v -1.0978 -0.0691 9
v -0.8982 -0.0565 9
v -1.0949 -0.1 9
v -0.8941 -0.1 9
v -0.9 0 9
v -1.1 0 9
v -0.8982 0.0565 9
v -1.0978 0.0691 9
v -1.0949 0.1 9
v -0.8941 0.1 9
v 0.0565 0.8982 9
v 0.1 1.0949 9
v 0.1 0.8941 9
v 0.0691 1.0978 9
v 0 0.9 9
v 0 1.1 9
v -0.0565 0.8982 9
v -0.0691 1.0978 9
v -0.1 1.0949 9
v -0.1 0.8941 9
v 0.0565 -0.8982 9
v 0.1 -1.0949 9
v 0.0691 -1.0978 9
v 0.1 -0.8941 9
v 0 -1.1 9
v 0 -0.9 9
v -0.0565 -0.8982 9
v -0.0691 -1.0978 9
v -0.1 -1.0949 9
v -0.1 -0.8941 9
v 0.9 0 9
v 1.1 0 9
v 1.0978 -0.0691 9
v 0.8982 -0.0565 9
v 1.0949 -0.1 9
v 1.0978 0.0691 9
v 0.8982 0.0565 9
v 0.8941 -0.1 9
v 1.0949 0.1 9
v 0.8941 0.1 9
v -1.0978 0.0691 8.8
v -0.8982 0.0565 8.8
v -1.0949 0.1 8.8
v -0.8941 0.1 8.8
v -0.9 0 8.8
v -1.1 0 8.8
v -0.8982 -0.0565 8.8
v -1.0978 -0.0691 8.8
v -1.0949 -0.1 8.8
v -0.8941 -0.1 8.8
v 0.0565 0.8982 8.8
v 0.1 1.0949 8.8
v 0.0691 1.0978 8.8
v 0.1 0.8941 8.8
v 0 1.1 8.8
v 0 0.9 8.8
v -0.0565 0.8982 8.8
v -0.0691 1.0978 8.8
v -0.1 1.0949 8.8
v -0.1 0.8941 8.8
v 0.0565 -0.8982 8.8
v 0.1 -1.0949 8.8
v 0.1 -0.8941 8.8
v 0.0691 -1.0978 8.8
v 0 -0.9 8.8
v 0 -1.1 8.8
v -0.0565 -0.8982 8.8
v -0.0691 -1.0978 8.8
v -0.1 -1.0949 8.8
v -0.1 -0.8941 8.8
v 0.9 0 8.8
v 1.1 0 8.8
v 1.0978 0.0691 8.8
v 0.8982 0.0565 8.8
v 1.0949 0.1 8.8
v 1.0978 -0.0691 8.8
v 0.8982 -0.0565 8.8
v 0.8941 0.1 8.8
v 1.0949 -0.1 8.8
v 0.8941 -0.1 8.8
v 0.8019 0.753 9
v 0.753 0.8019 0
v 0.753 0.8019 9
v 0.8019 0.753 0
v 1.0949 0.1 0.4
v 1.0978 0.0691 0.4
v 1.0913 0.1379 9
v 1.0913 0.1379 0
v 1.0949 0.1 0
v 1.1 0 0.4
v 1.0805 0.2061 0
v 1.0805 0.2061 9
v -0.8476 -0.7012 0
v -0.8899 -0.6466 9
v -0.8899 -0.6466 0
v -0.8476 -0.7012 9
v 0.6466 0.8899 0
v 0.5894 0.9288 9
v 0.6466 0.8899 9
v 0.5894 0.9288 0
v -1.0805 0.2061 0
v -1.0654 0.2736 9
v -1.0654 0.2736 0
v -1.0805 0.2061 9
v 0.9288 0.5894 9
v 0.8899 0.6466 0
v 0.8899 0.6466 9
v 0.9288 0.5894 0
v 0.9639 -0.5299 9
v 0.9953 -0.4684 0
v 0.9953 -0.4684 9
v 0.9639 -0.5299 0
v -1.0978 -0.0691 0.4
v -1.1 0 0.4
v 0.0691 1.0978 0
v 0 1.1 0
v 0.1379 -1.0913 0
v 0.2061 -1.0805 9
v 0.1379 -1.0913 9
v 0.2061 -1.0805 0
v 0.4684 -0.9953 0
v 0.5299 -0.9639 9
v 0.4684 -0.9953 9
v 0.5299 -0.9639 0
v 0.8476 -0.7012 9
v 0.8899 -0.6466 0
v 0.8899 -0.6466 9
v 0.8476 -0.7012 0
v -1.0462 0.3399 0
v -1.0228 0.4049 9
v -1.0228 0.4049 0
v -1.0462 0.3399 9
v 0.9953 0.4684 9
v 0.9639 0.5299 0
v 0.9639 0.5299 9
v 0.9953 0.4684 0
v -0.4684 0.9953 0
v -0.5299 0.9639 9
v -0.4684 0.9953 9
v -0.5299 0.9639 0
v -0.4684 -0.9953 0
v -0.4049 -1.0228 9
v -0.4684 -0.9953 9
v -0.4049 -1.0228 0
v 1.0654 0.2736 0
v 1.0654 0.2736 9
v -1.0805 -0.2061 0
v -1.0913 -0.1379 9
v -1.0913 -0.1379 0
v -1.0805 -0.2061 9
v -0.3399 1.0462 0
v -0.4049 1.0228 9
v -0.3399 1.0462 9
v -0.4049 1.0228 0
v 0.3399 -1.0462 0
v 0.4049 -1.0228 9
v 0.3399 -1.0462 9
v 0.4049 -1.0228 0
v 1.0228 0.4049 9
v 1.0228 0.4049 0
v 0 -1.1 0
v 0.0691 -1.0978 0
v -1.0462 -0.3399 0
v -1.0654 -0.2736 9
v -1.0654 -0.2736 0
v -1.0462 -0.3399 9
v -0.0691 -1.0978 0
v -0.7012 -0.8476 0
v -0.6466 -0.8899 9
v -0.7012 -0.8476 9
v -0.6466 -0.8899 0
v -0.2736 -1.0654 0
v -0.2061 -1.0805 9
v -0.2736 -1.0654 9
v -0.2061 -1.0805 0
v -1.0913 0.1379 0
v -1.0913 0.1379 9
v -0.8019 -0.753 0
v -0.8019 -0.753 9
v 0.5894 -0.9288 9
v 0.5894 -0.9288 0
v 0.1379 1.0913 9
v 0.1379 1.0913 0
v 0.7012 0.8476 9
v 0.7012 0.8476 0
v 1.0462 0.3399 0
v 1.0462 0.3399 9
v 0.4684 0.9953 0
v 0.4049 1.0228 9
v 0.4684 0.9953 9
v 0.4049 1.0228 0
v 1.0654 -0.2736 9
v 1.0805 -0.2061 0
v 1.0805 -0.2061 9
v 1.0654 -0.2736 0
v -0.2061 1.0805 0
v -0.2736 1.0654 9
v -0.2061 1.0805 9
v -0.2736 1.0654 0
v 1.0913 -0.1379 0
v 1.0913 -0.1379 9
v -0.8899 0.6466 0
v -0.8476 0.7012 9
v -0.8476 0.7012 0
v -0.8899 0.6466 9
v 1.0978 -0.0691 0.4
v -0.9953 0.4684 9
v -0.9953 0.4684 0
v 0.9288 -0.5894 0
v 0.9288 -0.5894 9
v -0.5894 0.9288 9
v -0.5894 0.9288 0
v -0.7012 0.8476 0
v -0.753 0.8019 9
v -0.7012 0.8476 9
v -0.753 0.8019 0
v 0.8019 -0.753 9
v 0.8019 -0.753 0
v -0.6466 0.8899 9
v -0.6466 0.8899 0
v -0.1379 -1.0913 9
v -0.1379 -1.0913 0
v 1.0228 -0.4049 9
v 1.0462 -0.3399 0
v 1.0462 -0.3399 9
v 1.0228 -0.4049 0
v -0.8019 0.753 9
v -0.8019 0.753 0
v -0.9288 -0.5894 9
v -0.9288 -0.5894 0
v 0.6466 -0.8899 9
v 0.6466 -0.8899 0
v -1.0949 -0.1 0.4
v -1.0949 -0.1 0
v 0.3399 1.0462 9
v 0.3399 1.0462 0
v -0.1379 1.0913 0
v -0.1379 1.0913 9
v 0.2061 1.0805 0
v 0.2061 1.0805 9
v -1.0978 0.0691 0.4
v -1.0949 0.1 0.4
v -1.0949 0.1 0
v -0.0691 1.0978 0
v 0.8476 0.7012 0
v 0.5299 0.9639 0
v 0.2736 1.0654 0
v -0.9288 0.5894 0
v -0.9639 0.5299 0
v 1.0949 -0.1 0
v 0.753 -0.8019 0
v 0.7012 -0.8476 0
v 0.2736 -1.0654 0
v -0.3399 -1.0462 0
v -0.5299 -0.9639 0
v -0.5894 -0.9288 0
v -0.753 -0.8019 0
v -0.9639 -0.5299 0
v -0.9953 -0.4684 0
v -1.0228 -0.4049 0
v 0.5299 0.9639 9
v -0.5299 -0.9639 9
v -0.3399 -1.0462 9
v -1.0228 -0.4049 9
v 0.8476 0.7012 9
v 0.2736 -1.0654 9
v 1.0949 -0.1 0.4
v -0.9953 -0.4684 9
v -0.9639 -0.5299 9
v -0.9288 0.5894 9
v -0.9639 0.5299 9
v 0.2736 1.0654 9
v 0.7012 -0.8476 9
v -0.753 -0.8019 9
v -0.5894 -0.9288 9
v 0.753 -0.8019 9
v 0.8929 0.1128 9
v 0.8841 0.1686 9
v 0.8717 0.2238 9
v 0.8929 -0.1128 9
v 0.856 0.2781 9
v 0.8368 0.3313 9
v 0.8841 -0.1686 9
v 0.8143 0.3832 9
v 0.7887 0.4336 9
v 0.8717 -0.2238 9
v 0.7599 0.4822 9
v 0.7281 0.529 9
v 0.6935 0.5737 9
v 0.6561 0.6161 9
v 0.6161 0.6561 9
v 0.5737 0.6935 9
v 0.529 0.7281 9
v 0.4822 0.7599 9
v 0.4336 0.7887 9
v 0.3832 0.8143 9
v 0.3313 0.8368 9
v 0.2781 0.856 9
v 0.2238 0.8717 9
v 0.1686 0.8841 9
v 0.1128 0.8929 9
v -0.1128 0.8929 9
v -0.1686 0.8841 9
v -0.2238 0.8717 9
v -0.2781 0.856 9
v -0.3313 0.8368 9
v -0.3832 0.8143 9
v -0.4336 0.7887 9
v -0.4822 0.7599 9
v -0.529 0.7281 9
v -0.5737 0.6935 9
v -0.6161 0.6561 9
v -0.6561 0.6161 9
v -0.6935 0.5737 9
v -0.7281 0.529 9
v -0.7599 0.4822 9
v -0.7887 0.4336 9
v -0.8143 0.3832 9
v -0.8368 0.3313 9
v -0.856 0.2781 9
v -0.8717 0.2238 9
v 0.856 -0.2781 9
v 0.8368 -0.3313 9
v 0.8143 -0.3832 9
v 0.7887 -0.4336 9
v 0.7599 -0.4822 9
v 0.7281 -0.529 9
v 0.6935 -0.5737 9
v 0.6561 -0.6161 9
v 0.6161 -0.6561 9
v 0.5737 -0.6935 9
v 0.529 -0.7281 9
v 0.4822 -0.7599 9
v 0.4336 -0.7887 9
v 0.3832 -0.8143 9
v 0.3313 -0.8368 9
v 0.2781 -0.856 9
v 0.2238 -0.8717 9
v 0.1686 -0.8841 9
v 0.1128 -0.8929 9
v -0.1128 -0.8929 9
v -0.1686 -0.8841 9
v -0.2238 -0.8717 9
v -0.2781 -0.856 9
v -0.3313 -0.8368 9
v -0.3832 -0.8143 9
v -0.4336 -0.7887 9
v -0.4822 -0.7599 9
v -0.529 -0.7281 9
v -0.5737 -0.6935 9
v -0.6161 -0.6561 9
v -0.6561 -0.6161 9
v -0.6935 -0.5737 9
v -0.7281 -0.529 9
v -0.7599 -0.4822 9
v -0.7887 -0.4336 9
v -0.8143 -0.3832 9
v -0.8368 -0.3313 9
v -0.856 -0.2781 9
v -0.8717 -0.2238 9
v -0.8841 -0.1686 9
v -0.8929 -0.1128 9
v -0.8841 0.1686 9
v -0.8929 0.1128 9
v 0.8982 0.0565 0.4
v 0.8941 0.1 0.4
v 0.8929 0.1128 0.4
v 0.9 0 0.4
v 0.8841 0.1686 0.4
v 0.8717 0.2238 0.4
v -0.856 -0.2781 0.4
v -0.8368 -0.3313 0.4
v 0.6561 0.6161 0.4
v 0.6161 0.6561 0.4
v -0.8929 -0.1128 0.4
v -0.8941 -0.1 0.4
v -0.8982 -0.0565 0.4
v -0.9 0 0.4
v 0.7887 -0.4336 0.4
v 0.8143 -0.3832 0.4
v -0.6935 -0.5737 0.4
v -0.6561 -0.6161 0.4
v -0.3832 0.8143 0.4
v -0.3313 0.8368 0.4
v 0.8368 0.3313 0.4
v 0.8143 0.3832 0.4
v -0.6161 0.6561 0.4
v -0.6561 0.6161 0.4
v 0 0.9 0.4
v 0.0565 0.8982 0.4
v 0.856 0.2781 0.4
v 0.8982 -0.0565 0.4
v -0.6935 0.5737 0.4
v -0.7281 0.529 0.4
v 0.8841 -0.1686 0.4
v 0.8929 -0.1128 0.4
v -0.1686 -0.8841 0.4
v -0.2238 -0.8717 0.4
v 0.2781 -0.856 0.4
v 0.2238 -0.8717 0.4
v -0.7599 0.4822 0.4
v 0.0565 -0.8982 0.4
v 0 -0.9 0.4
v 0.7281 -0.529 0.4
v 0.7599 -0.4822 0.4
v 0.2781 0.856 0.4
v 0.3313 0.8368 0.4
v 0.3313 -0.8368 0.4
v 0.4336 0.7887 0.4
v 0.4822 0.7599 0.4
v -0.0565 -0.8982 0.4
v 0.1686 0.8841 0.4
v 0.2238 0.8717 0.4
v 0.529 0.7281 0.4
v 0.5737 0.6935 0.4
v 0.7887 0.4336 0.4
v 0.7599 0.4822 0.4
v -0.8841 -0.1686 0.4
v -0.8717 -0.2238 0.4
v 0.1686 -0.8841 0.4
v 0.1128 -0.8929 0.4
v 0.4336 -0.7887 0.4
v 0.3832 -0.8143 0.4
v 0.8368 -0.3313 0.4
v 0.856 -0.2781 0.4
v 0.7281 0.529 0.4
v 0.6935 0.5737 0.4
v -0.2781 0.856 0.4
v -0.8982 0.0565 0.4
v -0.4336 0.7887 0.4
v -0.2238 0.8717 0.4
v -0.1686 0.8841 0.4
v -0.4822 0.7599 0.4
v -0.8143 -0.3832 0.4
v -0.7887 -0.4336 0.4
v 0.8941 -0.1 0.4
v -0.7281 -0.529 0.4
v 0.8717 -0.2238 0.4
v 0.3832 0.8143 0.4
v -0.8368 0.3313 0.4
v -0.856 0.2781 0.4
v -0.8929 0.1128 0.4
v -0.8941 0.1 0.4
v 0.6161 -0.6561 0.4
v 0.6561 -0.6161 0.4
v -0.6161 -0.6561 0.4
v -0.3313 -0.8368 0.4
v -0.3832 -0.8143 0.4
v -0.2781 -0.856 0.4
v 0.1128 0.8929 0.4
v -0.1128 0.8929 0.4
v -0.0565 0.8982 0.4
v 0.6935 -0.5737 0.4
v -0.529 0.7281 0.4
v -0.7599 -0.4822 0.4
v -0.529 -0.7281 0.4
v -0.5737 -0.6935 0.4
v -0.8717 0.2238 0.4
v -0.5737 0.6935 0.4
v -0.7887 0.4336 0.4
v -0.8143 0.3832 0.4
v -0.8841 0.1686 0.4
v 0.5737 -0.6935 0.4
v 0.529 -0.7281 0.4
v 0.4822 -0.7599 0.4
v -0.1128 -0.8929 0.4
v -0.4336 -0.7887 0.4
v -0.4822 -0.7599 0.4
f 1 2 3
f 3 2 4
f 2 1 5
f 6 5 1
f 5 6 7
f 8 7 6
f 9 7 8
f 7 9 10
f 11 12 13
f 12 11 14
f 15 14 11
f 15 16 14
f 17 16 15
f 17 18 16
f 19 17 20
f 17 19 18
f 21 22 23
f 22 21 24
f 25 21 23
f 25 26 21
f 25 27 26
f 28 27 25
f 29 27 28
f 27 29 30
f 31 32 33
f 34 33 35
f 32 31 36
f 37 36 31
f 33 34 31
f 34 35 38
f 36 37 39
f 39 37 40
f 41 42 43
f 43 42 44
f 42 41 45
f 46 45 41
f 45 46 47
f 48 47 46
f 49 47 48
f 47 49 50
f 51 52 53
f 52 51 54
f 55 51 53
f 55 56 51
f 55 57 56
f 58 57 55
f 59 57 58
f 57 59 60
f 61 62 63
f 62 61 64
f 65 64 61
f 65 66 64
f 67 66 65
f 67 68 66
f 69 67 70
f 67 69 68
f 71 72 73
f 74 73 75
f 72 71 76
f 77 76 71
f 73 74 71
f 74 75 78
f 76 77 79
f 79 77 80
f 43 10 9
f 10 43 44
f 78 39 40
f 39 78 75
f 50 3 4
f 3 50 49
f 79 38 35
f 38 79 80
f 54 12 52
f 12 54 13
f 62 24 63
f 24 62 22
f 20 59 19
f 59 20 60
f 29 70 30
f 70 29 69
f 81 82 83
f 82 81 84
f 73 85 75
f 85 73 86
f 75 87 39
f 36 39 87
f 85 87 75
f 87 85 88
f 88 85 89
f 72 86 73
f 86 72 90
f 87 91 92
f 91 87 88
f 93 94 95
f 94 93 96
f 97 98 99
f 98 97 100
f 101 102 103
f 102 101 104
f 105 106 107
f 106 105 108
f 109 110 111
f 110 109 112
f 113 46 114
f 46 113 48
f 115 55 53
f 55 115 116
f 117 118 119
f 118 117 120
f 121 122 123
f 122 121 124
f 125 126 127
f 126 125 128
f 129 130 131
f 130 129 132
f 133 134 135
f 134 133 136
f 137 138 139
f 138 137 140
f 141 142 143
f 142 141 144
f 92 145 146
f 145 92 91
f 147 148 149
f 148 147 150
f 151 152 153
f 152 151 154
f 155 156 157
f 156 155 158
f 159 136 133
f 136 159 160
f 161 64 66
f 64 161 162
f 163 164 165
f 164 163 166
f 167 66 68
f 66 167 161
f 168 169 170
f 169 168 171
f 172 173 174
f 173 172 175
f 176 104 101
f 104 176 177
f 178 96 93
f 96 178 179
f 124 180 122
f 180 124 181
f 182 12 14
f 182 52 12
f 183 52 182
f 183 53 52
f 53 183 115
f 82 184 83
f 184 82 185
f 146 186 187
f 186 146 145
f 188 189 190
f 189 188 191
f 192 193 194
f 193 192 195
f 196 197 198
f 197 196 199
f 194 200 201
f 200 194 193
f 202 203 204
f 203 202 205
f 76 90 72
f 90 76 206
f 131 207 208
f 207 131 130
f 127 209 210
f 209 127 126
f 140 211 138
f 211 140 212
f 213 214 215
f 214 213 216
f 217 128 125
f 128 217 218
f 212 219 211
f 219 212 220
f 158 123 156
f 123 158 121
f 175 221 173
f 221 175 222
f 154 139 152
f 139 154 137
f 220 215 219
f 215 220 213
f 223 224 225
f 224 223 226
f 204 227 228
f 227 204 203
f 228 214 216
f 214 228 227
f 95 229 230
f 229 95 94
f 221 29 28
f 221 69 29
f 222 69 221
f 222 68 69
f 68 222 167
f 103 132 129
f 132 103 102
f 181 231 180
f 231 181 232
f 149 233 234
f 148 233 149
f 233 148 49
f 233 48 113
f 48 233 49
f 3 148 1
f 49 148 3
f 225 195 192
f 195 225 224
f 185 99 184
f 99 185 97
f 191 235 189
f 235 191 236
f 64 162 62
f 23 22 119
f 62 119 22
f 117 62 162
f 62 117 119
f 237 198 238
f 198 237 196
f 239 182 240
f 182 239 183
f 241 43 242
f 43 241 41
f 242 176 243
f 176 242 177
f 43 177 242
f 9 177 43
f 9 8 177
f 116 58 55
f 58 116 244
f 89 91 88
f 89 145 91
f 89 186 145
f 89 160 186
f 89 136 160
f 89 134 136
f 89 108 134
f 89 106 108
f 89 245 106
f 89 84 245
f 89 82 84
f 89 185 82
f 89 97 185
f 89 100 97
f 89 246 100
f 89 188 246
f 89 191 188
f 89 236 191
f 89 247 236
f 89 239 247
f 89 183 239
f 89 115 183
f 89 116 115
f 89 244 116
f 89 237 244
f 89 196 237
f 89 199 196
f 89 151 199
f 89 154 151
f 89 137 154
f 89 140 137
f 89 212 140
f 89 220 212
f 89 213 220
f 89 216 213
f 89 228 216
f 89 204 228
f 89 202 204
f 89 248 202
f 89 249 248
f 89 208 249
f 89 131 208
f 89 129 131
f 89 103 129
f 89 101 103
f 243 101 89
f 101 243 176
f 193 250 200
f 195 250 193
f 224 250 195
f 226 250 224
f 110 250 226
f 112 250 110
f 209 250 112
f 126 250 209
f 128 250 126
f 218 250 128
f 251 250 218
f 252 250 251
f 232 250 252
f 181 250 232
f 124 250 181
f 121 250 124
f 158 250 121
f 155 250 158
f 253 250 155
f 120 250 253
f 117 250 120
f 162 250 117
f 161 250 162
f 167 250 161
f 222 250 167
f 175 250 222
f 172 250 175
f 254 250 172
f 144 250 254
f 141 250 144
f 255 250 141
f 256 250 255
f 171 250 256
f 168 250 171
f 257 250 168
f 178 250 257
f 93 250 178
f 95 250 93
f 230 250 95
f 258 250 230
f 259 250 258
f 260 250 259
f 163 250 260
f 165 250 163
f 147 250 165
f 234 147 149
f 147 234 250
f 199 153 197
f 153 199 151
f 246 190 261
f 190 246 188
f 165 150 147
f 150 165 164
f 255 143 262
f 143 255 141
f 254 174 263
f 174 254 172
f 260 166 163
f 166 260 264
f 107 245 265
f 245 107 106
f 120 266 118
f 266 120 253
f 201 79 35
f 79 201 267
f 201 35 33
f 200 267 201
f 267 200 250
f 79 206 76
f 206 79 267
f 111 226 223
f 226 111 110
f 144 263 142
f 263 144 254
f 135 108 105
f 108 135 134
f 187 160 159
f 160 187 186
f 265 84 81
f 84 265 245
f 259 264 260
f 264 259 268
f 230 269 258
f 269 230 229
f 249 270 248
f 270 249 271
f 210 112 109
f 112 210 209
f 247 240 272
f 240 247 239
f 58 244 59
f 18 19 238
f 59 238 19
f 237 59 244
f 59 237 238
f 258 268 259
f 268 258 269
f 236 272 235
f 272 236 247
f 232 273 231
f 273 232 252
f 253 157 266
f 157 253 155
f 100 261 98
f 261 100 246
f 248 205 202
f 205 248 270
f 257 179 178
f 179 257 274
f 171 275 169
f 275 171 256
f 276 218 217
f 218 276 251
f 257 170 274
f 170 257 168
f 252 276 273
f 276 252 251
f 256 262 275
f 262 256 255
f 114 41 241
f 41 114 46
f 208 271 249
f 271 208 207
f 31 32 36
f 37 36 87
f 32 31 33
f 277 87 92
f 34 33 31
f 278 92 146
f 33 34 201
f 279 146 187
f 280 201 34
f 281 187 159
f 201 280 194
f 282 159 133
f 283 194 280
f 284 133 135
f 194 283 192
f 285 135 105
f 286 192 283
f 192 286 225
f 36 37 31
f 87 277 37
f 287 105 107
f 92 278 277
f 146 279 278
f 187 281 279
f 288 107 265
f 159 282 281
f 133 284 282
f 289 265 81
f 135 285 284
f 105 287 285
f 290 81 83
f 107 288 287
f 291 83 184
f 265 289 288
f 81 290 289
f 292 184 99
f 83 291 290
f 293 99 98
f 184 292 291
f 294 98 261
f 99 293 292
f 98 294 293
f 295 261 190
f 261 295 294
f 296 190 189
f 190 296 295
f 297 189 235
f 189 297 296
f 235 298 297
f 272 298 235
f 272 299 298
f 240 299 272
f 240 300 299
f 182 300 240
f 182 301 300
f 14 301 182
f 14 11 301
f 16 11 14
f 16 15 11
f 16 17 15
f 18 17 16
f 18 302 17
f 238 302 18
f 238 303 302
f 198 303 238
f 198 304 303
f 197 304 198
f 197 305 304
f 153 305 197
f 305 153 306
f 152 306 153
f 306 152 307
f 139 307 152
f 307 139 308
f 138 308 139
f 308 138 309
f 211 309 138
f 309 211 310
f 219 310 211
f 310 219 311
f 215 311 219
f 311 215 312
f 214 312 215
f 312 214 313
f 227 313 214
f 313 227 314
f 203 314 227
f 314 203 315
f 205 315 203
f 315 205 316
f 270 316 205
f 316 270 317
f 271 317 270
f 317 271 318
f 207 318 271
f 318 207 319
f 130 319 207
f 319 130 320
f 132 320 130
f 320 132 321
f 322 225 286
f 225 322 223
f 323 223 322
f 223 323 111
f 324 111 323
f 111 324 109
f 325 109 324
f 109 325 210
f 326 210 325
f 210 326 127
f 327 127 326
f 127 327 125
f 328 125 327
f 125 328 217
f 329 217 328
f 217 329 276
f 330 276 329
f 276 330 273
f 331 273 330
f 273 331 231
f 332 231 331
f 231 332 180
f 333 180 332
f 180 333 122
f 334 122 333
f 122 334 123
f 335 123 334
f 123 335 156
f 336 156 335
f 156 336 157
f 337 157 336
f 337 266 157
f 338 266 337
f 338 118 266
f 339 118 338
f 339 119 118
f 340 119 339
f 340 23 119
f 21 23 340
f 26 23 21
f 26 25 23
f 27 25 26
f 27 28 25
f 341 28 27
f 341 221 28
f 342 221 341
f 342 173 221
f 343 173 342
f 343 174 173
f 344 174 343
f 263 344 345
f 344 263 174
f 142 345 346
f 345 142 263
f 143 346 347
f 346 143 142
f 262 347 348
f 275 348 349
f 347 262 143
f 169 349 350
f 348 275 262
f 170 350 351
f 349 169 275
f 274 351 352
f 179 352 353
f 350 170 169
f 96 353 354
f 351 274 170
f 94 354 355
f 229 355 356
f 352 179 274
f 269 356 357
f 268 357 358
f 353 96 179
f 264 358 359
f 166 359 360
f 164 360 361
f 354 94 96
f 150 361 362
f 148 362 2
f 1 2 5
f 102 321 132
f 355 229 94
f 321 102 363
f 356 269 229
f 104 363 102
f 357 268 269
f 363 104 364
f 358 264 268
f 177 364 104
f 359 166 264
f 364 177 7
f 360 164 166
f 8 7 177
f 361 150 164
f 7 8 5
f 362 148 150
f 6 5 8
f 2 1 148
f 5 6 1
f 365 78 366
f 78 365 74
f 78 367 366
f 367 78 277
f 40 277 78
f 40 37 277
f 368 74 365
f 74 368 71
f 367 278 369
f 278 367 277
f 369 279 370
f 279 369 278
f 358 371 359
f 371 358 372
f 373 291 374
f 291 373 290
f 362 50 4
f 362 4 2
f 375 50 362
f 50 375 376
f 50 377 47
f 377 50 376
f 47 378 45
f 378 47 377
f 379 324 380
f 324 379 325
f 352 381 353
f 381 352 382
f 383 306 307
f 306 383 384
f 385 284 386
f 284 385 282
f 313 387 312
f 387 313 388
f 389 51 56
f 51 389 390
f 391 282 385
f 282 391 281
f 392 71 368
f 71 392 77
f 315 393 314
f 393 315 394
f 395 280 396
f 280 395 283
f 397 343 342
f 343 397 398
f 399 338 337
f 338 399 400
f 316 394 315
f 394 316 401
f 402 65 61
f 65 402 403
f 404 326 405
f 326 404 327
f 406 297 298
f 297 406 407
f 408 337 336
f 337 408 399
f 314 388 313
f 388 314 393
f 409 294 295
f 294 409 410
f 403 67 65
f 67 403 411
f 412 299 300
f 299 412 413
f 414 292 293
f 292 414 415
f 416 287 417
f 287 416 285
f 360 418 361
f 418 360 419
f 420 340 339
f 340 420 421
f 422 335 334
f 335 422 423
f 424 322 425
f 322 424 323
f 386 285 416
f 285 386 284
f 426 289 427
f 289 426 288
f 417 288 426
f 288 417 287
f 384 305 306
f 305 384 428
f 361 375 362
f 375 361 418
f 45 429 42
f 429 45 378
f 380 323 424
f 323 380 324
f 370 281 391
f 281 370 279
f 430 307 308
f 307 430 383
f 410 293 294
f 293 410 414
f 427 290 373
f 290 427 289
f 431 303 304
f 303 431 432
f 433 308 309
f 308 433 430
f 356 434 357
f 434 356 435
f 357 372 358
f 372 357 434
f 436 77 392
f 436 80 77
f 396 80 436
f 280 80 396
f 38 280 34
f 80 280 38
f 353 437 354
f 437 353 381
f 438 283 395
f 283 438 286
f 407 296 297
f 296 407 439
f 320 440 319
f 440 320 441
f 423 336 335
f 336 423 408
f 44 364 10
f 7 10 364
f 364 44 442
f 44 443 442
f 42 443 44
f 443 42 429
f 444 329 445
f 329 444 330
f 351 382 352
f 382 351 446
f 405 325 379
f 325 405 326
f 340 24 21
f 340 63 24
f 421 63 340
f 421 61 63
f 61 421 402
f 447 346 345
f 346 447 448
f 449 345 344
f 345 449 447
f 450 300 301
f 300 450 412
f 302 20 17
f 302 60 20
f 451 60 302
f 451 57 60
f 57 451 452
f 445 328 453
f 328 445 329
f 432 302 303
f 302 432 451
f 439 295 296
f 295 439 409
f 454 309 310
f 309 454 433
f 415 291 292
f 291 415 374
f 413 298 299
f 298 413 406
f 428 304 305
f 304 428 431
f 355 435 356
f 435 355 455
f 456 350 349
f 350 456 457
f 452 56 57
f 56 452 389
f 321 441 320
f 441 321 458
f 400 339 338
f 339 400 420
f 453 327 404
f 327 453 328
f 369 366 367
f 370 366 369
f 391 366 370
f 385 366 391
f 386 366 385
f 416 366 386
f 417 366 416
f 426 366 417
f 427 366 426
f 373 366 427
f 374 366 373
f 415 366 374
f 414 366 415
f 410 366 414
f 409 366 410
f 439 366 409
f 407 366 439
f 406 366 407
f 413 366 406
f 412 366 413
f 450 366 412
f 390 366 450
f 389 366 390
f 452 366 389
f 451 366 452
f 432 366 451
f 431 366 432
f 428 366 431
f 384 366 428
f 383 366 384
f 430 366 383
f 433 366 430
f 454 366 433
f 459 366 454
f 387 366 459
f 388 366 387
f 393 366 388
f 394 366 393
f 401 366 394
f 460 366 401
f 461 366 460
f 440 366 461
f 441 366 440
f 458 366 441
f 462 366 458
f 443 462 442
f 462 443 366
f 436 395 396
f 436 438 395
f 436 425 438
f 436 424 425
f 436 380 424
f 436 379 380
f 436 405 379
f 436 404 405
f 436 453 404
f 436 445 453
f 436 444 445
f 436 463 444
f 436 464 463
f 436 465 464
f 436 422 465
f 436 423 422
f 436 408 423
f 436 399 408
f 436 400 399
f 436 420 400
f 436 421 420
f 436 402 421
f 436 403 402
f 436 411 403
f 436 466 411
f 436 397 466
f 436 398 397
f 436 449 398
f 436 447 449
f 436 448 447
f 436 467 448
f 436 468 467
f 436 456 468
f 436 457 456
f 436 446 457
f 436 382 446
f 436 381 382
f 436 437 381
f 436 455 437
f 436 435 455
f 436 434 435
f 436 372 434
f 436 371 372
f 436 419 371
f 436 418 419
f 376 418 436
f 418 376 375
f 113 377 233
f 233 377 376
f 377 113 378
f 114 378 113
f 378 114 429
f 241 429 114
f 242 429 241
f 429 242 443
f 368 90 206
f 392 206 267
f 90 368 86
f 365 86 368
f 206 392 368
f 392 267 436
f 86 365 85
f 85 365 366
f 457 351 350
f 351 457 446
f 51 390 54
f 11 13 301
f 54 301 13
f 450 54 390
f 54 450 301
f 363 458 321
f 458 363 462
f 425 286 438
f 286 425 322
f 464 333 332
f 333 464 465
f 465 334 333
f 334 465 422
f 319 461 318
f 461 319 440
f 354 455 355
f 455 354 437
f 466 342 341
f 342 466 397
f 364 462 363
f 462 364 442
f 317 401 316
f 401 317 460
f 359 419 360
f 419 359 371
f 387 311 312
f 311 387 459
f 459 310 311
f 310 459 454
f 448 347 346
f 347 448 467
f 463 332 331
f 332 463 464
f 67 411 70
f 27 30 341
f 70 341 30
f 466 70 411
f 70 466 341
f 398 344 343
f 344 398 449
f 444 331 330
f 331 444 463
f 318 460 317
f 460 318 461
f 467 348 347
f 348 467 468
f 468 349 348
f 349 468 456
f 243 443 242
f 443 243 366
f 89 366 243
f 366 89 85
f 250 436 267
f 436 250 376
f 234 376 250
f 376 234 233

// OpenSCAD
// length of the tube
length = 9;
// diameter of the tube end
diameter = 2.2;
// Width of the gap for the elastic and the tube end
gapWidth = 0.2;
// thickness of the print
thickness = 0.4;

$fn = 100;
module TubeHolder(length, radius, thickness, gapWidth){
    

            difference(){
                cylinder(length,radius, radius);
                
                translate([0,0,thickness]){
                    cylinder(length, radius - thickness/2, radius - thickness/2);
                }
                translate([0,0,length - gapWidth/2 ]){
                    cube([2*radius, gapWidth, gapWidth], true);
                    cube([gapWidth, 2*radius, gapWidth], true);
                }
                cube([2*radius,gapWidth,thickness * 2], true);
            }
}

TubeHolder(length, diameter/2, thickness, gapWidth);
